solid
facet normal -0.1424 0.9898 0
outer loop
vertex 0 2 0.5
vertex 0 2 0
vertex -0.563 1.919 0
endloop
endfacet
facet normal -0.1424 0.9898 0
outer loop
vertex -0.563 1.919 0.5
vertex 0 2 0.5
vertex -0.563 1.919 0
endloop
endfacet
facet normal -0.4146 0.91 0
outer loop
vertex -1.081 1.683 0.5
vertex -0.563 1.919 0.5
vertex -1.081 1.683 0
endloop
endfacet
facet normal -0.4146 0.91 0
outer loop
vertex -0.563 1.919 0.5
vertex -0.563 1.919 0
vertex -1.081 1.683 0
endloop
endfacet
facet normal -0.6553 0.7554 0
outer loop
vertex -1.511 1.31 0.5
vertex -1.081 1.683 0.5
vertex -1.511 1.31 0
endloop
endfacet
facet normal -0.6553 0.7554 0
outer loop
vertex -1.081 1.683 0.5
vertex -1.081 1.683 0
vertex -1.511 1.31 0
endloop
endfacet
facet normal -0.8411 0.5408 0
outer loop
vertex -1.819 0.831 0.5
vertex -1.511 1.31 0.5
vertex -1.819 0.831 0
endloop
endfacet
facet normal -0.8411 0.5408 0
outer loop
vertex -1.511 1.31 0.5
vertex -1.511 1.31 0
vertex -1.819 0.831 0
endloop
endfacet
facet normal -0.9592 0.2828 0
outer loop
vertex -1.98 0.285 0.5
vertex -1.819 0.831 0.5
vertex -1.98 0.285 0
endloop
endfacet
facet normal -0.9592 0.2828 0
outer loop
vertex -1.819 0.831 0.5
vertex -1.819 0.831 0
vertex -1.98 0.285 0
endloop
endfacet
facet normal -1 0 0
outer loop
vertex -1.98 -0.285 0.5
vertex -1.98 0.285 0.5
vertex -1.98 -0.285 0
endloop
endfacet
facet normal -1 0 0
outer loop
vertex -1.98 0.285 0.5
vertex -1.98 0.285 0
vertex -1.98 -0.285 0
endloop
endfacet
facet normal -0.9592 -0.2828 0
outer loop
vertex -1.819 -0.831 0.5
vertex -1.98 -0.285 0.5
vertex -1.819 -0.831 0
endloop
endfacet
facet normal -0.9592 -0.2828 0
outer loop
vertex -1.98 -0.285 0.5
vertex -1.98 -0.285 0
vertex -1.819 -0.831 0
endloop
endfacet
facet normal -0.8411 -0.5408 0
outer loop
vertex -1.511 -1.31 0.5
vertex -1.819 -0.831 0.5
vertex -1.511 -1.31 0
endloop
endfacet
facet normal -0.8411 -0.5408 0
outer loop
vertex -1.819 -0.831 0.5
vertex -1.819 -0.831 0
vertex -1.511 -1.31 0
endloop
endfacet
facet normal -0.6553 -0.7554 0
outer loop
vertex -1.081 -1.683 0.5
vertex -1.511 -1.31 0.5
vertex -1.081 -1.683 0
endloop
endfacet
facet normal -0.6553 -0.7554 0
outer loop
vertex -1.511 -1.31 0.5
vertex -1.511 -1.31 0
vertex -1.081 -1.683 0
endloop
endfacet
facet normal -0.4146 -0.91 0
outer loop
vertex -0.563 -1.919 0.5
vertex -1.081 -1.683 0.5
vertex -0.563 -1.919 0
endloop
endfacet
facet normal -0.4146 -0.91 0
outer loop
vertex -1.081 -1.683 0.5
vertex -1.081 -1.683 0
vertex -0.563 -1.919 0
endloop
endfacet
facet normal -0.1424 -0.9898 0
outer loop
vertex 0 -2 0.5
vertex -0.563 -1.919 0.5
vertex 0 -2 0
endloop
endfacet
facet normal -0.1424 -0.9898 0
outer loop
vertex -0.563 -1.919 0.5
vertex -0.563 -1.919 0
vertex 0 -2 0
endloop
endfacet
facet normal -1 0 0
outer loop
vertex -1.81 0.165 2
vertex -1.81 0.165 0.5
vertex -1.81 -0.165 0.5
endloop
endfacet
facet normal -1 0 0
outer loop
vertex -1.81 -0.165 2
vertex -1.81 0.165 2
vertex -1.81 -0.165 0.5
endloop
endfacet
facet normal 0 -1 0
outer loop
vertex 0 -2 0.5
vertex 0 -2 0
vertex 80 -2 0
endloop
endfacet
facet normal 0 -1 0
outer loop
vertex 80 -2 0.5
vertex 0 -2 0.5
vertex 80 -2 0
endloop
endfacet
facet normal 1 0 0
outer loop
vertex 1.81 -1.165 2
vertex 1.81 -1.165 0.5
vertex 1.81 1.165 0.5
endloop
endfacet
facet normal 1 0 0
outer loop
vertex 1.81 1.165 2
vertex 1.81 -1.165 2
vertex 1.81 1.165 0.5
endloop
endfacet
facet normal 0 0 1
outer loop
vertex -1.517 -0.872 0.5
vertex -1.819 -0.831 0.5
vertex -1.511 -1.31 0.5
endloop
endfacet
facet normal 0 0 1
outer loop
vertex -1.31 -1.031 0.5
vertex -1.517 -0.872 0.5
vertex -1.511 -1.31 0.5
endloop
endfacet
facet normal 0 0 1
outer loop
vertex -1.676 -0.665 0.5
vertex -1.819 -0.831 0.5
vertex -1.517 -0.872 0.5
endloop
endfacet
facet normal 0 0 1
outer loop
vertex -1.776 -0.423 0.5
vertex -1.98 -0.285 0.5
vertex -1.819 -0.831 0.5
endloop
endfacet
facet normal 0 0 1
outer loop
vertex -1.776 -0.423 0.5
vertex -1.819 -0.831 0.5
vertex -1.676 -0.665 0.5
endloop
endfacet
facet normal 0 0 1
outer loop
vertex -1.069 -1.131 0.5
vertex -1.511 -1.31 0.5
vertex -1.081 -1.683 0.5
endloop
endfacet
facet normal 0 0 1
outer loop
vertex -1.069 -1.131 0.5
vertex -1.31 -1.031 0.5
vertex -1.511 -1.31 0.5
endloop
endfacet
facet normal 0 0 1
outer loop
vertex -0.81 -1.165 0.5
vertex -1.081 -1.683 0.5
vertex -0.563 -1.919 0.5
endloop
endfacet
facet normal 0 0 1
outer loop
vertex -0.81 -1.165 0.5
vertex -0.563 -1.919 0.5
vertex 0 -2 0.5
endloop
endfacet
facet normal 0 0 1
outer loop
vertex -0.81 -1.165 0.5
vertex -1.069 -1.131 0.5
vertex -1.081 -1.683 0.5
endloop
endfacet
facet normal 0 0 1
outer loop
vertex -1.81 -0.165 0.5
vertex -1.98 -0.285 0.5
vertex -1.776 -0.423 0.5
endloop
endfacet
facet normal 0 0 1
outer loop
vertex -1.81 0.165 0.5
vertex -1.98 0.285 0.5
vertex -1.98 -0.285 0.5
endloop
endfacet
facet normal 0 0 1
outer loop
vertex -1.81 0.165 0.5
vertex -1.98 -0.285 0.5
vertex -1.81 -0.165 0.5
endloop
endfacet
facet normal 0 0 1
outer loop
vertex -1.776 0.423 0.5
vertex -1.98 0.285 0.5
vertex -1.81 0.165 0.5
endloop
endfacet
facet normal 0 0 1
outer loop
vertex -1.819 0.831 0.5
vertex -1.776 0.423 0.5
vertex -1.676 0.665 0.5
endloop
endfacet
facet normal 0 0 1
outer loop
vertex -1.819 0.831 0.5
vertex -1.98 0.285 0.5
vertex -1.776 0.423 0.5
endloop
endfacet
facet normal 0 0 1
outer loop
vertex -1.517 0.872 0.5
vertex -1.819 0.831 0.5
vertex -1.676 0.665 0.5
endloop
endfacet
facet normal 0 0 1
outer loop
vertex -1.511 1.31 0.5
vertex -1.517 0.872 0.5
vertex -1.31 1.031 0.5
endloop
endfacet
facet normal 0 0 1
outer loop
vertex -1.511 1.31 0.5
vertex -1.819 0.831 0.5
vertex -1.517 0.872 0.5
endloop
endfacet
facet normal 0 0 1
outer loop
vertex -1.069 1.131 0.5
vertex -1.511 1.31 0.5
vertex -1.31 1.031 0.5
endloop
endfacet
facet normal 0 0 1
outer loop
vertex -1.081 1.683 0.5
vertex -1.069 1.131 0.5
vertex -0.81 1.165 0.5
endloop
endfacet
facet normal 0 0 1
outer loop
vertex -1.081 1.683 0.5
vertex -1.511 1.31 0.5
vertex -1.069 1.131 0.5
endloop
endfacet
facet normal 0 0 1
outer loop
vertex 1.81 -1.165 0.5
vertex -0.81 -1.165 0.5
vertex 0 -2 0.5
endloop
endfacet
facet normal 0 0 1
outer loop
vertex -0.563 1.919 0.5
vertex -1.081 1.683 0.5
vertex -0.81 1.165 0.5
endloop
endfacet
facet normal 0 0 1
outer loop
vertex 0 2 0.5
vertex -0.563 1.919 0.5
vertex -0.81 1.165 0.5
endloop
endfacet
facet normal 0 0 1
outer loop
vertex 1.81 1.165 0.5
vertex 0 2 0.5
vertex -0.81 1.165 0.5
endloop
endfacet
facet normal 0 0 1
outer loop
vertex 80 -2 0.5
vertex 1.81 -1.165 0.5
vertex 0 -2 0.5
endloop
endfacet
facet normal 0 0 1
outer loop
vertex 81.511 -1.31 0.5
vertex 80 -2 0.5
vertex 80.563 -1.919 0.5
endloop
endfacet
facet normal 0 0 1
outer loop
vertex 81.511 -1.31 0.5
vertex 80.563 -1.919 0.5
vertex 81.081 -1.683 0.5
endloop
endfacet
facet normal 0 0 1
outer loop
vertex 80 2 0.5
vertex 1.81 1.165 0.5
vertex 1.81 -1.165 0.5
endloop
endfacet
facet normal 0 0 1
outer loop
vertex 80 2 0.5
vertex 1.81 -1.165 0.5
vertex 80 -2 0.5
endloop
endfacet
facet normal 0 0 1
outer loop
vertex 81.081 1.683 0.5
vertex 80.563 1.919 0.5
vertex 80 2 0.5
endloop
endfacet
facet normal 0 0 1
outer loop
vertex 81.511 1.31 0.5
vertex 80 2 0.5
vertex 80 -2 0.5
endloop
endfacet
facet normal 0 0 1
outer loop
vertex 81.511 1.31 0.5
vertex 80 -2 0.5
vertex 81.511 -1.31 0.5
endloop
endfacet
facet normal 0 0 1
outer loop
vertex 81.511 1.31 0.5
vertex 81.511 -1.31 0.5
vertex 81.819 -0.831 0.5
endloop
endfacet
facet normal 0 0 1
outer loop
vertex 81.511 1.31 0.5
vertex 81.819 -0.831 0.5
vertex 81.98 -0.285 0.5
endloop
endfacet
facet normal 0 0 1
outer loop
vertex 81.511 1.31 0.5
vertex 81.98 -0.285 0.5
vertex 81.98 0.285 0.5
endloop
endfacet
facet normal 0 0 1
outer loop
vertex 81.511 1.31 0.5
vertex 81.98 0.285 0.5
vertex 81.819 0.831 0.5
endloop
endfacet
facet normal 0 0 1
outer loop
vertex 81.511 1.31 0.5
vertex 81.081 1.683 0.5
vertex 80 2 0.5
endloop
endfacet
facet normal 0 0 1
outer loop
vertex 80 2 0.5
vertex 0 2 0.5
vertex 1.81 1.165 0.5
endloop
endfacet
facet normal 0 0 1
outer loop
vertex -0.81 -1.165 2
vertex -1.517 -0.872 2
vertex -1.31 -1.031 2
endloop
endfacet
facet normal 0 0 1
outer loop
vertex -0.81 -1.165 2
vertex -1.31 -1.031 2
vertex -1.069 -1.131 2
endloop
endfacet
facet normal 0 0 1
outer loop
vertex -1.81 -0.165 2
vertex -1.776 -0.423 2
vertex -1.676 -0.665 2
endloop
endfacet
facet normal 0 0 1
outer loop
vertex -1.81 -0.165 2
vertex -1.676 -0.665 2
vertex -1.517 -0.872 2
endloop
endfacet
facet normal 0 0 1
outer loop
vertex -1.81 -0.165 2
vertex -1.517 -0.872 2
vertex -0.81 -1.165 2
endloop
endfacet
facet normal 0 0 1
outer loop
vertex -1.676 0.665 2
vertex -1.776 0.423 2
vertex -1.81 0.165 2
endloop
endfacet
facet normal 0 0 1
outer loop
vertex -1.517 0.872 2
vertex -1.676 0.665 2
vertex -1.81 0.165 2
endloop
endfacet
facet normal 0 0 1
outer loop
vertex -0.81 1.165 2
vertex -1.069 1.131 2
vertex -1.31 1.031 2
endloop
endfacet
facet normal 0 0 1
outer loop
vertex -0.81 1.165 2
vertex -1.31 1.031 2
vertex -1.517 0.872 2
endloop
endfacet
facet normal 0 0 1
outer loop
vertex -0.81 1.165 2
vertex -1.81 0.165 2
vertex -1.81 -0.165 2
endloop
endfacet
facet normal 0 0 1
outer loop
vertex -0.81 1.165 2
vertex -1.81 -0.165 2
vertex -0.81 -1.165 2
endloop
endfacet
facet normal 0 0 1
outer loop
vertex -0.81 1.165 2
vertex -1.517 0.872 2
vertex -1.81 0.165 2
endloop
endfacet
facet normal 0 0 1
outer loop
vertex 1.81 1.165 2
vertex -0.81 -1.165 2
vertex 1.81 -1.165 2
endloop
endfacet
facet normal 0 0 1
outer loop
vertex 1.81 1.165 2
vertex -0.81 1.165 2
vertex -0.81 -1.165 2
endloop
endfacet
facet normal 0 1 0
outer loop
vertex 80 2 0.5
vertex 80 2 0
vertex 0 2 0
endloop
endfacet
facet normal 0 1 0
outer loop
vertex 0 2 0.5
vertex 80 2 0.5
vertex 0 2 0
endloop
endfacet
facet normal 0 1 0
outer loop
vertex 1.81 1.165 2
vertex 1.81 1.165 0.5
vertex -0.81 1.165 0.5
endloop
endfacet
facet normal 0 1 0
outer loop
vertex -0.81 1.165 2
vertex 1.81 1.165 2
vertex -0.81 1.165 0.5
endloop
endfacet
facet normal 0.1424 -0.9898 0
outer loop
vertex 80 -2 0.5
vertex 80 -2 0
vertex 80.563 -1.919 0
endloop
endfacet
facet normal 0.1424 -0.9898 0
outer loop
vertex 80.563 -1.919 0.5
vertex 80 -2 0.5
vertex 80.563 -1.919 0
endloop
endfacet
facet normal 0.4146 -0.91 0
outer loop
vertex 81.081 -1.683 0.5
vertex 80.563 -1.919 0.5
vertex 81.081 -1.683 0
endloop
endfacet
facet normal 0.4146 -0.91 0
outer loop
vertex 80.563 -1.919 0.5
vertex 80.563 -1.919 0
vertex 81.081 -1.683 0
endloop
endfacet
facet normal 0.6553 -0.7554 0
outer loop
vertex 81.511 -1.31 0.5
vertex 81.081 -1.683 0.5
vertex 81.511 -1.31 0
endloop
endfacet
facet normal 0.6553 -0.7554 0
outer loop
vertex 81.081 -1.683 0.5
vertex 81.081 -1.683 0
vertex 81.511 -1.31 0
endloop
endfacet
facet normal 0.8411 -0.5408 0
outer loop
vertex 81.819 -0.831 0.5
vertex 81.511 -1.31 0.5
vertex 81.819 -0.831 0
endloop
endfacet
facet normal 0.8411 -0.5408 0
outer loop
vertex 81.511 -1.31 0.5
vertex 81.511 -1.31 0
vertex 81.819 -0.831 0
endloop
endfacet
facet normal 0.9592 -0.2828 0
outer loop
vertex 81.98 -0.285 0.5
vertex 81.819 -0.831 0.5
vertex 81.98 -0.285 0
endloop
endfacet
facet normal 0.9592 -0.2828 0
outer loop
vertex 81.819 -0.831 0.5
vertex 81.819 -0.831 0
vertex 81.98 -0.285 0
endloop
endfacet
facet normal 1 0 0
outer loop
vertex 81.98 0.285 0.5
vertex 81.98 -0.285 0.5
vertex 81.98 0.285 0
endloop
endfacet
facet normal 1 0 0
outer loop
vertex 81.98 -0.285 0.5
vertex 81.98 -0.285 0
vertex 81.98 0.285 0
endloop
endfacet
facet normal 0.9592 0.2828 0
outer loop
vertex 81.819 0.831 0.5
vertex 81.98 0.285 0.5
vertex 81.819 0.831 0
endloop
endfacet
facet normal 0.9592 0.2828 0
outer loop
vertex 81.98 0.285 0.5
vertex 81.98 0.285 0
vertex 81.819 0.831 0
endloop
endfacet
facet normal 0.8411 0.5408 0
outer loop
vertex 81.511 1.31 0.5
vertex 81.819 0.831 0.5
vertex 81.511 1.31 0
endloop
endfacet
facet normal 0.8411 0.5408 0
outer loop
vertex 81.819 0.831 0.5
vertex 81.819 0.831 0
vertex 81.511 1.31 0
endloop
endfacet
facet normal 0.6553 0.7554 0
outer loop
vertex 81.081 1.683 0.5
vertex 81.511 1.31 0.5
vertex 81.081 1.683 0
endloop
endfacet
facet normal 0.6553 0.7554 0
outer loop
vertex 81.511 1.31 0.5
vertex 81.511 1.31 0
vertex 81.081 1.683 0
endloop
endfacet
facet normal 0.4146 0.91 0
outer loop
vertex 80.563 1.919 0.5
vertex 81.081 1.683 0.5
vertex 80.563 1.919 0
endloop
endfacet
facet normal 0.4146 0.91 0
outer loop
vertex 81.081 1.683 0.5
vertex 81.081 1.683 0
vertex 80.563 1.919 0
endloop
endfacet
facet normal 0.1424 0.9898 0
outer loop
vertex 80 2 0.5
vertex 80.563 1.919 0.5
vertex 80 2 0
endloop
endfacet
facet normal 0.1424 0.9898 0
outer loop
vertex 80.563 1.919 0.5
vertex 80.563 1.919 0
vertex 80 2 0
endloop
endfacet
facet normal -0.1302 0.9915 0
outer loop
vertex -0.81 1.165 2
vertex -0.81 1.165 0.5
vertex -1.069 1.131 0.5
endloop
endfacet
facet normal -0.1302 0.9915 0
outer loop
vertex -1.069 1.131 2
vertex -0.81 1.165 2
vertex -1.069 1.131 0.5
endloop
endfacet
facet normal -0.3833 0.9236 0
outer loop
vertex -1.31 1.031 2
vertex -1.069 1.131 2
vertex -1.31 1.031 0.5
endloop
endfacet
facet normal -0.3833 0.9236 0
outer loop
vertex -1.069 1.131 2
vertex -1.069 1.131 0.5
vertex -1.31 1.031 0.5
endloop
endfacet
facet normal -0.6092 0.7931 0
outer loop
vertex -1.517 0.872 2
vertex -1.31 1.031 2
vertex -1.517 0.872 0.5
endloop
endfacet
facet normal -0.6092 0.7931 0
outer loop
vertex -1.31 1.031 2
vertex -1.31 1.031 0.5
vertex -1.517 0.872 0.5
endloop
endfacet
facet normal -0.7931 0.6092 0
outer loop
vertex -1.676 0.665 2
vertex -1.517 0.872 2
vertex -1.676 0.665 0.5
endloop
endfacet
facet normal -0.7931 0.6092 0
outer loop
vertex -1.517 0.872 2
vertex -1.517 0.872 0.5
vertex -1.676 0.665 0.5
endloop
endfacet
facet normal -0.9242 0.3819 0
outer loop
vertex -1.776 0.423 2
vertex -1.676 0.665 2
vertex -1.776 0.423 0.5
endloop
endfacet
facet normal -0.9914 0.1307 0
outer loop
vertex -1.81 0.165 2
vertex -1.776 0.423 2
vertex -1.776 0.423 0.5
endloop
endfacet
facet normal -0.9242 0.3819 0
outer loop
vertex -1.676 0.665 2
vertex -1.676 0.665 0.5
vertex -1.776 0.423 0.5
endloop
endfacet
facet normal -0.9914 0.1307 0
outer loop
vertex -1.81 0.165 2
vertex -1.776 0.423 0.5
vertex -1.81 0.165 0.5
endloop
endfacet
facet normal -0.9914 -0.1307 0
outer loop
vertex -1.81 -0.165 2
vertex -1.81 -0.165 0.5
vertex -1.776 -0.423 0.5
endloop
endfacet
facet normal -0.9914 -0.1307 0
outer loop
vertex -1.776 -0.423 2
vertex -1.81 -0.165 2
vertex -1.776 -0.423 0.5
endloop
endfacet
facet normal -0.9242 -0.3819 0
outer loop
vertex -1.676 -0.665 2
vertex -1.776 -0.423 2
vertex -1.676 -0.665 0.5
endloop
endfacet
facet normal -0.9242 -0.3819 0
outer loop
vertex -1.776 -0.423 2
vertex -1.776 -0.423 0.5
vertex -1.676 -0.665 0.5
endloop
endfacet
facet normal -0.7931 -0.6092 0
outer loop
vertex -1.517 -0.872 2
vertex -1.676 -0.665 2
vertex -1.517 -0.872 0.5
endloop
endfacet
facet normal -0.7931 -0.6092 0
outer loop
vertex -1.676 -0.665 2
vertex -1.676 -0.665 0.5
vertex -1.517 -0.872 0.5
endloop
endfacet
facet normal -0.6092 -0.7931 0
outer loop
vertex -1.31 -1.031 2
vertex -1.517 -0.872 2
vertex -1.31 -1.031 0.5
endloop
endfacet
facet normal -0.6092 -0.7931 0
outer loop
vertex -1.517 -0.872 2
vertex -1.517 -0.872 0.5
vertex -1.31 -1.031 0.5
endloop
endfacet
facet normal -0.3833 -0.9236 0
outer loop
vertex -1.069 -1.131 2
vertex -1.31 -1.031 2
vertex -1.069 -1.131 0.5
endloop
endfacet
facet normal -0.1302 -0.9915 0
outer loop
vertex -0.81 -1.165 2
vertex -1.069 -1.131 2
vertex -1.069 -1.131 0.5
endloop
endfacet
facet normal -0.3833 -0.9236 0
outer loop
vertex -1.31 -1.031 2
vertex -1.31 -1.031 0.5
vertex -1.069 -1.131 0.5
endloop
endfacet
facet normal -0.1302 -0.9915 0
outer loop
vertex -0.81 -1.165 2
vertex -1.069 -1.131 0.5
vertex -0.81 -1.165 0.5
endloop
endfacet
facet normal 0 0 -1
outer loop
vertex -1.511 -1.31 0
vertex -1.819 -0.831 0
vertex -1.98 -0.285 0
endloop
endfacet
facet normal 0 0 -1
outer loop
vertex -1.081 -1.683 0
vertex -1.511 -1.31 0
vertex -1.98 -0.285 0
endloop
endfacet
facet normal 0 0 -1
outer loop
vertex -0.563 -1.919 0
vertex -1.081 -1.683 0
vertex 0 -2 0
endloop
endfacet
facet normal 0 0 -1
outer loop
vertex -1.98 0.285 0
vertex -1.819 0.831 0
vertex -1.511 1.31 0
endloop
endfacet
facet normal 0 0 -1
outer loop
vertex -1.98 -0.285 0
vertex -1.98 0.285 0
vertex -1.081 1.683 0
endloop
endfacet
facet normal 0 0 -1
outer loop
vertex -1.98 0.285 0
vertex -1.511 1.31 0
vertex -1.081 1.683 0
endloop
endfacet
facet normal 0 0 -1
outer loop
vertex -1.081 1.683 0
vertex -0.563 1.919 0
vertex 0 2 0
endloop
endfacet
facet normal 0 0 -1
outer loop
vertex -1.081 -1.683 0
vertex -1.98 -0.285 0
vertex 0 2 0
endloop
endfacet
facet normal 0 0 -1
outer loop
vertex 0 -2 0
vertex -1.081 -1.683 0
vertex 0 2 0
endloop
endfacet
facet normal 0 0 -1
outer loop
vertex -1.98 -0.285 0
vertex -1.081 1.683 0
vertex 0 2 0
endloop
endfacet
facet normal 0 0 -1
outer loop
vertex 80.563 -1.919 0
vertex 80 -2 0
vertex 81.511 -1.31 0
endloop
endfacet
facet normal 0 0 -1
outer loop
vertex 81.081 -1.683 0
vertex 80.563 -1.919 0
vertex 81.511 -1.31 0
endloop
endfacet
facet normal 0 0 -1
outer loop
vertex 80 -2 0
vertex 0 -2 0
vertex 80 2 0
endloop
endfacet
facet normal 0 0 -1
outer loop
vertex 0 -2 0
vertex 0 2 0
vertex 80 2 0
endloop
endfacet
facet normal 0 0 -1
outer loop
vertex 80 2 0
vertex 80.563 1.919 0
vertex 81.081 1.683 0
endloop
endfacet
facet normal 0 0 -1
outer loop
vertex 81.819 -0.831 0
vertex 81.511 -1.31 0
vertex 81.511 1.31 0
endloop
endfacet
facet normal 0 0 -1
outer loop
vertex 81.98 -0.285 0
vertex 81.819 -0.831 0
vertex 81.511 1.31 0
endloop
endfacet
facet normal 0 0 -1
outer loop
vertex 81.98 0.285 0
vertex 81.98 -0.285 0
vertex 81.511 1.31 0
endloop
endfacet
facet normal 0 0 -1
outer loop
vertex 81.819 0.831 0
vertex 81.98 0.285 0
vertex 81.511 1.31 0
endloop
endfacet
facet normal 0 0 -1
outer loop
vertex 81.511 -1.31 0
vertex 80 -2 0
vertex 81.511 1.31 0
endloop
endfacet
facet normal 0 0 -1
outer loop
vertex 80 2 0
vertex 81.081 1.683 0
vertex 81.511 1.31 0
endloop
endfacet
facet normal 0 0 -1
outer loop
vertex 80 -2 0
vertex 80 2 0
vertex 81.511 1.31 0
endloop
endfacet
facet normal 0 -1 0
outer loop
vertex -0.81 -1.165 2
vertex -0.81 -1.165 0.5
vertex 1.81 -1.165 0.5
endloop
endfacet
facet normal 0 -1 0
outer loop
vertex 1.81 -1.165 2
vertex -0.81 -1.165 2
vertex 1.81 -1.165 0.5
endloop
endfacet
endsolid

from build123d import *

# Parameters (mm, degrees)
BOSS_EXTRU_1_DEPTH = 0.5
BOSS_EXTRU_2_DEPTH = 1.5


with BuildPart() as part:
    # Esquisse1 → Boss.-Extru.1 (new body)
    with BuildSketch(Plane.XY):
        with BuildLine():
            Line((0, -2), (80, -2))
            ThreePointArc((80, -2), (82, 0), (80, 2))
            Line((80, 2), (0, 2))
            ThreePointArc((0, 2), (-2, 0), (0, -2))
        make_face()
    extrude(amount=BOSS_EXTRU_1_DEPTH)

    # Esquisse2 → Boss.-Extru.2 (add)
    with BuildSketch(Plane.XY.offset(0.5)):
        with BuildLine():
            Line((-0.809863383, -1.164625511), (1.809863383, -1.164625511))
            Line((1.809863383, -1.164625511), (1.809863383, 1.164625511))
            Line((1.809863383, 1.164625511), (-0.809863383, 1.164625511))
            ThreePointArc((-0.809863383, 1.164625511), (-1.516970164, 0.871732292), (-1.809863383, 0.164625511))
            Line((-1.809863383, 0.164625511), (-1.809863383, -0.164625511))
            ThreePointArc((-1.809863383, -0.164625511), (-1.516970164, -0.871732292), (-0.809863383, -1.164625511))
        make_face()
    extrude(amount=BOSS_EXTRU_2_DEPTH)


solid = part.part
